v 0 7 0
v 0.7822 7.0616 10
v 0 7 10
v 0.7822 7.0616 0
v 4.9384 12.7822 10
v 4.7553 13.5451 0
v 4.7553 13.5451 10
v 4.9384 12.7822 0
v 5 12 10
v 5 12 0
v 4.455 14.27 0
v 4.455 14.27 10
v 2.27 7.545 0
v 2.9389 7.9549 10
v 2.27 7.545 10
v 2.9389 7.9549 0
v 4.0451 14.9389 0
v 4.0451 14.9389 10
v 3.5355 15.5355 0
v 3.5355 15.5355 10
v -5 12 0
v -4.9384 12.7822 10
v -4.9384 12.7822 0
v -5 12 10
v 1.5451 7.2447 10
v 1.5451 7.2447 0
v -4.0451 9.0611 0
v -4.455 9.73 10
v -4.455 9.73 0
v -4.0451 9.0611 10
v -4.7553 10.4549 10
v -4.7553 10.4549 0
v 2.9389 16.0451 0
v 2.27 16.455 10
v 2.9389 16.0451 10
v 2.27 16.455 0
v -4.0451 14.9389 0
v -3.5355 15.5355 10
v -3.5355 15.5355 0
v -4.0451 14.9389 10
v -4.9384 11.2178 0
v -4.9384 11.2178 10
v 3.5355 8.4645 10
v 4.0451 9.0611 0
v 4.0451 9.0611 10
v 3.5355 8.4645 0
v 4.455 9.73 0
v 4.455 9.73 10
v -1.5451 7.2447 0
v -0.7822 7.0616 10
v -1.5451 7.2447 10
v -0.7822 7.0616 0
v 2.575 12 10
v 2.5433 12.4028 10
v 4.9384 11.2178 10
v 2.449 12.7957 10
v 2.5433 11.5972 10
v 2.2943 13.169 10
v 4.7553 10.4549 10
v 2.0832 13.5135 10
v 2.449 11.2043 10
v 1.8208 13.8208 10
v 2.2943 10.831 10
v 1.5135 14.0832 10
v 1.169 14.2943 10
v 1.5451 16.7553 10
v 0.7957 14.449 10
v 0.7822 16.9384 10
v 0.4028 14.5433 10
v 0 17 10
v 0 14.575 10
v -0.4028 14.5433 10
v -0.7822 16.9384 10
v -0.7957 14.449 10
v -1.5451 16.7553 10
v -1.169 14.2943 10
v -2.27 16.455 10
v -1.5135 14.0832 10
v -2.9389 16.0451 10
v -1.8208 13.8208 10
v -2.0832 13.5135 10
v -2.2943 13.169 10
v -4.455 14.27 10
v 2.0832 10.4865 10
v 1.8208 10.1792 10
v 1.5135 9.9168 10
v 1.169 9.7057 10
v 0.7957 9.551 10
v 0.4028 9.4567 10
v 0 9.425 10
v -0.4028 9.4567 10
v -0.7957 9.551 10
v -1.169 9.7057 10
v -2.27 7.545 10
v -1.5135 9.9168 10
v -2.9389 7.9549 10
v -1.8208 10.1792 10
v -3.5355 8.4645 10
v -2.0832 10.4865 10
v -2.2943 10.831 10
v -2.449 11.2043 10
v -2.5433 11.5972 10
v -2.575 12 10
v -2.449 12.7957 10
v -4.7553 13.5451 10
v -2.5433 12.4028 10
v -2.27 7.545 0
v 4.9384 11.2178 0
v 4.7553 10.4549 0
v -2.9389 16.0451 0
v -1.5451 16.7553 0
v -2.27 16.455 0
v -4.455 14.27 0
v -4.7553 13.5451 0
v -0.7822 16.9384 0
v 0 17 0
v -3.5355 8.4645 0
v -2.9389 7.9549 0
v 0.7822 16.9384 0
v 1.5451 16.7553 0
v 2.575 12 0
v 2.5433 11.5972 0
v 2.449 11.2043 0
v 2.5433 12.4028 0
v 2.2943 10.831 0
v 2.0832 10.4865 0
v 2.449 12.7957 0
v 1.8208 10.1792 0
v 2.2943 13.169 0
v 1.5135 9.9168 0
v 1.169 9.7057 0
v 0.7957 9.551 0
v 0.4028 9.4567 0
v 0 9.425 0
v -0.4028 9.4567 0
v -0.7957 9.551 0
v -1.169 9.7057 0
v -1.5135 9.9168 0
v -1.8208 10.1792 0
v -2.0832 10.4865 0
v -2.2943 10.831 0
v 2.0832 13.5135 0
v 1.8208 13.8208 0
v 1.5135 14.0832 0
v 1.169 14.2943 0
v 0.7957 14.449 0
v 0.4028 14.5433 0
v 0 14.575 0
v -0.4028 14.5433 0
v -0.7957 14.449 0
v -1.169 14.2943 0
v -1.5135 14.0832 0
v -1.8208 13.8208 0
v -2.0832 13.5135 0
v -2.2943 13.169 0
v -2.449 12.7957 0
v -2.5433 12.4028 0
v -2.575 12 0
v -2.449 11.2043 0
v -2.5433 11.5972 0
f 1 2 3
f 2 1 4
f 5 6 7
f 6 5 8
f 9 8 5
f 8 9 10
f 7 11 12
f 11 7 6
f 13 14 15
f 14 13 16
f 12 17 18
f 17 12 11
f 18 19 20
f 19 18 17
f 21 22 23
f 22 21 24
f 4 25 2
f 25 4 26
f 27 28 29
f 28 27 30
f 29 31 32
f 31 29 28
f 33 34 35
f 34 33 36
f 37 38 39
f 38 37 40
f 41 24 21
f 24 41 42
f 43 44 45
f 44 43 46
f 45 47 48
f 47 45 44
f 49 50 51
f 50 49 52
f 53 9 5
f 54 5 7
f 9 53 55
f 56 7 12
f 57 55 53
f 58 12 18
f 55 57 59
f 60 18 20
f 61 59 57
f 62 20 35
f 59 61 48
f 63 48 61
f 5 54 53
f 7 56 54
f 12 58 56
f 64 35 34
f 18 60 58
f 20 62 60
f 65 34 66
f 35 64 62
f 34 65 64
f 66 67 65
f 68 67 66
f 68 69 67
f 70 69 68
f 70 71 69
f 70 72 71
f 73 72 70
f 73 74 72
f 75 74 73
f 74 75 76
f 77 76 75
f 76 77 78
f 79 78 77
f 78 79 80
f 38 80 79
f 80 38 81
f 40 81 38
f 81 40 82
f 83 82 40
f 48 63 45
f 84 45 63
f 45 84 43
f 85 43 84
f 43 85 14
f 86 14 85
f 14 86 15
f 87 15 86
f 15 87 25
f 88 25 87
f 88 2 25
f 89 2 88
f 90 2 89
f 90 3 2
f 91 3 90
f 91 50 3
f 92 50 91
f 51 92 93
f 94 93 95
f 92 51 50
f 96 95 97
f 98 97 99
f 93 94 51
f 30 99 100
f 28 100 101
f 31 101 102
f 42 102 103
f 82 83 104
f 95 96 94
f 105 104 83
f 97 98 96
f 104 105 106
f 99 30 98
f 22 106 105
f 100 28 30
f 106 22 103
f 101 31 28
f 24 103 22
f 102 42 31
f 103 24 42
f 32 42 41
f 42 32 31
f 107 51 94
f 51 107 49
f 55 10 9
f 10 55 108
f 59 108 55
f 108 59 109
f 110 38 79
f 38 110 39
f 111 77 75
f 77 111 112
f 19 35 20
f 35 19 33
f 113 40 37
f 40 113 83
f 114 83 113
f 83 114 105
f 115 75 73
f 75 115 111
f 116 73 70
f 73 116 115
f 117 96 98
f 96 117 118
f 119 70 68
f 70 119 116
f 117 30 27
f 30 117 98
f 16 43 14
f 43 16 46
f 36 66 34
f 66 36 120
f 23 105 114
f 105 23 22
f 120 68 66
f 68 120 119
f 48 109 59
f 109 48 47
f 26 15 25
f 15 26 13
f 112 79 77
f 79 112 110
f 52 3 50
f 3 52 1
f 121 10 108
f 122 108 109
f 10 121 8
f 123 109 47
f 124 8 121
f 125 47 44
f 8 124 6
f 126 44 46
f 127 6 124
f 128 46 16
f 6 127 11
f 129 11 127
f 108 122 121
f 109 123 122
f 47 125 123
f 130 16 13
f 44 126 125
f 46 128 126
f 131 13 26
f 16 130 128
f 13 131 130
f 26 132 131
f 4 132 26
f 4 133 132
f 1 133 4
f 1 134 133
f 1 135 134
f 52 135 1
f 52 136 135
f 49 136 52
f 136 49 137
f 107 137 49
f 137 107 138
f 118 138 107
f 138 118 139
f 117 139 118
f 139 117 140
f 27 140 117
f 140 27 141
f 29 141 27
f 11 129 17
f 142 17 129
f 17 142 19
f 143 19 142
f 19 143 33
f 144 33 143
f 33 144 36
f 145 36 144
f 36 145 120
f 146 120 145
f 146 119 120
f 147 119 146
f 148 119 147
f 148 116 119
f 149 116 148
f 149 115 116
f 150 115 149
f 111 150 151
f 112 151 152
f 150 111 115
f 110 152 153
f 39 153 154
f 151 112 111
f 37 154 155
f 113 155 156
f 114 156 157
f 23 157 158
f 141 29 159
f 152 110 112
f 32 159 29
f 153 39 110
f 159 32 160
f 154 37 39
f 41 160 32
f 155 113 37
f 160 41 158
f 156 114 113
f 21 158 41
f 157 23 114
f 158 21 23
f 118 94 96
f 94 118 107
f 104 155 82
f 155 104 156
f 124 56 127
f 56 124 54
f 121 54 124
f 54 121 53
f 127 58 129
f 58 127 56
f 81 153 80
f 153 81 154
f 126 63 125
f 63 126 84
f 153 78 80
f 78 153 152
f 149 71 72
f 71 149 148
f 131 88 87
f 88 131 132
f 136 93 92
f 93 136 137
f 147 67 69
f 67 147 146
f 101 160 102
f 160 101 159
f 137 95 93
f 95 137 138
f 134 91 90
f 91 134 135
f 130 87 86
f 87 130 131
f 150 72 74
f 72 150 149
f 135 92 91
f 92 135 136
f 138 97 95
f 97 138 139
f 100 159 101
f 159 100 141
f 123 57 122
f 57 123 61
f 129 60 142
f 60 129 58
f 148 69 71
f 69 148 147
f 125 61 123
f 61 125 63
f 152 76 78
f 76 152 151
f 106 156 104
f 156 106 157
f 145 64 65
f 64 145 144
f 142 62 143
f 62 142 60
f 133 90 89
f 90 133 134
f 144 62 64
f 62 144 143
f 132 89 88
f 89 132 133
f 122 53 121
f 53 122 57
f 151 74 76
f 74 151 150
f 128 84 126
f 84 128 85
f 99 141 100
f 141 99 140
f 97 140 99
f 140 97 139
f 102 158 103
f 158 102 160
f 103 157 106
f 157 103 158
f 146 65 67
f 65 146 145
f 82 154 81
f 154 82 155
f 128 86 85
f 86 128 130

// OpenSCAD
$fn=40;


translate([0,12,0]) difference(){
    cylinder(r=10/2,h=10);
    cylinder(r=5.15/2,h=12);
}
